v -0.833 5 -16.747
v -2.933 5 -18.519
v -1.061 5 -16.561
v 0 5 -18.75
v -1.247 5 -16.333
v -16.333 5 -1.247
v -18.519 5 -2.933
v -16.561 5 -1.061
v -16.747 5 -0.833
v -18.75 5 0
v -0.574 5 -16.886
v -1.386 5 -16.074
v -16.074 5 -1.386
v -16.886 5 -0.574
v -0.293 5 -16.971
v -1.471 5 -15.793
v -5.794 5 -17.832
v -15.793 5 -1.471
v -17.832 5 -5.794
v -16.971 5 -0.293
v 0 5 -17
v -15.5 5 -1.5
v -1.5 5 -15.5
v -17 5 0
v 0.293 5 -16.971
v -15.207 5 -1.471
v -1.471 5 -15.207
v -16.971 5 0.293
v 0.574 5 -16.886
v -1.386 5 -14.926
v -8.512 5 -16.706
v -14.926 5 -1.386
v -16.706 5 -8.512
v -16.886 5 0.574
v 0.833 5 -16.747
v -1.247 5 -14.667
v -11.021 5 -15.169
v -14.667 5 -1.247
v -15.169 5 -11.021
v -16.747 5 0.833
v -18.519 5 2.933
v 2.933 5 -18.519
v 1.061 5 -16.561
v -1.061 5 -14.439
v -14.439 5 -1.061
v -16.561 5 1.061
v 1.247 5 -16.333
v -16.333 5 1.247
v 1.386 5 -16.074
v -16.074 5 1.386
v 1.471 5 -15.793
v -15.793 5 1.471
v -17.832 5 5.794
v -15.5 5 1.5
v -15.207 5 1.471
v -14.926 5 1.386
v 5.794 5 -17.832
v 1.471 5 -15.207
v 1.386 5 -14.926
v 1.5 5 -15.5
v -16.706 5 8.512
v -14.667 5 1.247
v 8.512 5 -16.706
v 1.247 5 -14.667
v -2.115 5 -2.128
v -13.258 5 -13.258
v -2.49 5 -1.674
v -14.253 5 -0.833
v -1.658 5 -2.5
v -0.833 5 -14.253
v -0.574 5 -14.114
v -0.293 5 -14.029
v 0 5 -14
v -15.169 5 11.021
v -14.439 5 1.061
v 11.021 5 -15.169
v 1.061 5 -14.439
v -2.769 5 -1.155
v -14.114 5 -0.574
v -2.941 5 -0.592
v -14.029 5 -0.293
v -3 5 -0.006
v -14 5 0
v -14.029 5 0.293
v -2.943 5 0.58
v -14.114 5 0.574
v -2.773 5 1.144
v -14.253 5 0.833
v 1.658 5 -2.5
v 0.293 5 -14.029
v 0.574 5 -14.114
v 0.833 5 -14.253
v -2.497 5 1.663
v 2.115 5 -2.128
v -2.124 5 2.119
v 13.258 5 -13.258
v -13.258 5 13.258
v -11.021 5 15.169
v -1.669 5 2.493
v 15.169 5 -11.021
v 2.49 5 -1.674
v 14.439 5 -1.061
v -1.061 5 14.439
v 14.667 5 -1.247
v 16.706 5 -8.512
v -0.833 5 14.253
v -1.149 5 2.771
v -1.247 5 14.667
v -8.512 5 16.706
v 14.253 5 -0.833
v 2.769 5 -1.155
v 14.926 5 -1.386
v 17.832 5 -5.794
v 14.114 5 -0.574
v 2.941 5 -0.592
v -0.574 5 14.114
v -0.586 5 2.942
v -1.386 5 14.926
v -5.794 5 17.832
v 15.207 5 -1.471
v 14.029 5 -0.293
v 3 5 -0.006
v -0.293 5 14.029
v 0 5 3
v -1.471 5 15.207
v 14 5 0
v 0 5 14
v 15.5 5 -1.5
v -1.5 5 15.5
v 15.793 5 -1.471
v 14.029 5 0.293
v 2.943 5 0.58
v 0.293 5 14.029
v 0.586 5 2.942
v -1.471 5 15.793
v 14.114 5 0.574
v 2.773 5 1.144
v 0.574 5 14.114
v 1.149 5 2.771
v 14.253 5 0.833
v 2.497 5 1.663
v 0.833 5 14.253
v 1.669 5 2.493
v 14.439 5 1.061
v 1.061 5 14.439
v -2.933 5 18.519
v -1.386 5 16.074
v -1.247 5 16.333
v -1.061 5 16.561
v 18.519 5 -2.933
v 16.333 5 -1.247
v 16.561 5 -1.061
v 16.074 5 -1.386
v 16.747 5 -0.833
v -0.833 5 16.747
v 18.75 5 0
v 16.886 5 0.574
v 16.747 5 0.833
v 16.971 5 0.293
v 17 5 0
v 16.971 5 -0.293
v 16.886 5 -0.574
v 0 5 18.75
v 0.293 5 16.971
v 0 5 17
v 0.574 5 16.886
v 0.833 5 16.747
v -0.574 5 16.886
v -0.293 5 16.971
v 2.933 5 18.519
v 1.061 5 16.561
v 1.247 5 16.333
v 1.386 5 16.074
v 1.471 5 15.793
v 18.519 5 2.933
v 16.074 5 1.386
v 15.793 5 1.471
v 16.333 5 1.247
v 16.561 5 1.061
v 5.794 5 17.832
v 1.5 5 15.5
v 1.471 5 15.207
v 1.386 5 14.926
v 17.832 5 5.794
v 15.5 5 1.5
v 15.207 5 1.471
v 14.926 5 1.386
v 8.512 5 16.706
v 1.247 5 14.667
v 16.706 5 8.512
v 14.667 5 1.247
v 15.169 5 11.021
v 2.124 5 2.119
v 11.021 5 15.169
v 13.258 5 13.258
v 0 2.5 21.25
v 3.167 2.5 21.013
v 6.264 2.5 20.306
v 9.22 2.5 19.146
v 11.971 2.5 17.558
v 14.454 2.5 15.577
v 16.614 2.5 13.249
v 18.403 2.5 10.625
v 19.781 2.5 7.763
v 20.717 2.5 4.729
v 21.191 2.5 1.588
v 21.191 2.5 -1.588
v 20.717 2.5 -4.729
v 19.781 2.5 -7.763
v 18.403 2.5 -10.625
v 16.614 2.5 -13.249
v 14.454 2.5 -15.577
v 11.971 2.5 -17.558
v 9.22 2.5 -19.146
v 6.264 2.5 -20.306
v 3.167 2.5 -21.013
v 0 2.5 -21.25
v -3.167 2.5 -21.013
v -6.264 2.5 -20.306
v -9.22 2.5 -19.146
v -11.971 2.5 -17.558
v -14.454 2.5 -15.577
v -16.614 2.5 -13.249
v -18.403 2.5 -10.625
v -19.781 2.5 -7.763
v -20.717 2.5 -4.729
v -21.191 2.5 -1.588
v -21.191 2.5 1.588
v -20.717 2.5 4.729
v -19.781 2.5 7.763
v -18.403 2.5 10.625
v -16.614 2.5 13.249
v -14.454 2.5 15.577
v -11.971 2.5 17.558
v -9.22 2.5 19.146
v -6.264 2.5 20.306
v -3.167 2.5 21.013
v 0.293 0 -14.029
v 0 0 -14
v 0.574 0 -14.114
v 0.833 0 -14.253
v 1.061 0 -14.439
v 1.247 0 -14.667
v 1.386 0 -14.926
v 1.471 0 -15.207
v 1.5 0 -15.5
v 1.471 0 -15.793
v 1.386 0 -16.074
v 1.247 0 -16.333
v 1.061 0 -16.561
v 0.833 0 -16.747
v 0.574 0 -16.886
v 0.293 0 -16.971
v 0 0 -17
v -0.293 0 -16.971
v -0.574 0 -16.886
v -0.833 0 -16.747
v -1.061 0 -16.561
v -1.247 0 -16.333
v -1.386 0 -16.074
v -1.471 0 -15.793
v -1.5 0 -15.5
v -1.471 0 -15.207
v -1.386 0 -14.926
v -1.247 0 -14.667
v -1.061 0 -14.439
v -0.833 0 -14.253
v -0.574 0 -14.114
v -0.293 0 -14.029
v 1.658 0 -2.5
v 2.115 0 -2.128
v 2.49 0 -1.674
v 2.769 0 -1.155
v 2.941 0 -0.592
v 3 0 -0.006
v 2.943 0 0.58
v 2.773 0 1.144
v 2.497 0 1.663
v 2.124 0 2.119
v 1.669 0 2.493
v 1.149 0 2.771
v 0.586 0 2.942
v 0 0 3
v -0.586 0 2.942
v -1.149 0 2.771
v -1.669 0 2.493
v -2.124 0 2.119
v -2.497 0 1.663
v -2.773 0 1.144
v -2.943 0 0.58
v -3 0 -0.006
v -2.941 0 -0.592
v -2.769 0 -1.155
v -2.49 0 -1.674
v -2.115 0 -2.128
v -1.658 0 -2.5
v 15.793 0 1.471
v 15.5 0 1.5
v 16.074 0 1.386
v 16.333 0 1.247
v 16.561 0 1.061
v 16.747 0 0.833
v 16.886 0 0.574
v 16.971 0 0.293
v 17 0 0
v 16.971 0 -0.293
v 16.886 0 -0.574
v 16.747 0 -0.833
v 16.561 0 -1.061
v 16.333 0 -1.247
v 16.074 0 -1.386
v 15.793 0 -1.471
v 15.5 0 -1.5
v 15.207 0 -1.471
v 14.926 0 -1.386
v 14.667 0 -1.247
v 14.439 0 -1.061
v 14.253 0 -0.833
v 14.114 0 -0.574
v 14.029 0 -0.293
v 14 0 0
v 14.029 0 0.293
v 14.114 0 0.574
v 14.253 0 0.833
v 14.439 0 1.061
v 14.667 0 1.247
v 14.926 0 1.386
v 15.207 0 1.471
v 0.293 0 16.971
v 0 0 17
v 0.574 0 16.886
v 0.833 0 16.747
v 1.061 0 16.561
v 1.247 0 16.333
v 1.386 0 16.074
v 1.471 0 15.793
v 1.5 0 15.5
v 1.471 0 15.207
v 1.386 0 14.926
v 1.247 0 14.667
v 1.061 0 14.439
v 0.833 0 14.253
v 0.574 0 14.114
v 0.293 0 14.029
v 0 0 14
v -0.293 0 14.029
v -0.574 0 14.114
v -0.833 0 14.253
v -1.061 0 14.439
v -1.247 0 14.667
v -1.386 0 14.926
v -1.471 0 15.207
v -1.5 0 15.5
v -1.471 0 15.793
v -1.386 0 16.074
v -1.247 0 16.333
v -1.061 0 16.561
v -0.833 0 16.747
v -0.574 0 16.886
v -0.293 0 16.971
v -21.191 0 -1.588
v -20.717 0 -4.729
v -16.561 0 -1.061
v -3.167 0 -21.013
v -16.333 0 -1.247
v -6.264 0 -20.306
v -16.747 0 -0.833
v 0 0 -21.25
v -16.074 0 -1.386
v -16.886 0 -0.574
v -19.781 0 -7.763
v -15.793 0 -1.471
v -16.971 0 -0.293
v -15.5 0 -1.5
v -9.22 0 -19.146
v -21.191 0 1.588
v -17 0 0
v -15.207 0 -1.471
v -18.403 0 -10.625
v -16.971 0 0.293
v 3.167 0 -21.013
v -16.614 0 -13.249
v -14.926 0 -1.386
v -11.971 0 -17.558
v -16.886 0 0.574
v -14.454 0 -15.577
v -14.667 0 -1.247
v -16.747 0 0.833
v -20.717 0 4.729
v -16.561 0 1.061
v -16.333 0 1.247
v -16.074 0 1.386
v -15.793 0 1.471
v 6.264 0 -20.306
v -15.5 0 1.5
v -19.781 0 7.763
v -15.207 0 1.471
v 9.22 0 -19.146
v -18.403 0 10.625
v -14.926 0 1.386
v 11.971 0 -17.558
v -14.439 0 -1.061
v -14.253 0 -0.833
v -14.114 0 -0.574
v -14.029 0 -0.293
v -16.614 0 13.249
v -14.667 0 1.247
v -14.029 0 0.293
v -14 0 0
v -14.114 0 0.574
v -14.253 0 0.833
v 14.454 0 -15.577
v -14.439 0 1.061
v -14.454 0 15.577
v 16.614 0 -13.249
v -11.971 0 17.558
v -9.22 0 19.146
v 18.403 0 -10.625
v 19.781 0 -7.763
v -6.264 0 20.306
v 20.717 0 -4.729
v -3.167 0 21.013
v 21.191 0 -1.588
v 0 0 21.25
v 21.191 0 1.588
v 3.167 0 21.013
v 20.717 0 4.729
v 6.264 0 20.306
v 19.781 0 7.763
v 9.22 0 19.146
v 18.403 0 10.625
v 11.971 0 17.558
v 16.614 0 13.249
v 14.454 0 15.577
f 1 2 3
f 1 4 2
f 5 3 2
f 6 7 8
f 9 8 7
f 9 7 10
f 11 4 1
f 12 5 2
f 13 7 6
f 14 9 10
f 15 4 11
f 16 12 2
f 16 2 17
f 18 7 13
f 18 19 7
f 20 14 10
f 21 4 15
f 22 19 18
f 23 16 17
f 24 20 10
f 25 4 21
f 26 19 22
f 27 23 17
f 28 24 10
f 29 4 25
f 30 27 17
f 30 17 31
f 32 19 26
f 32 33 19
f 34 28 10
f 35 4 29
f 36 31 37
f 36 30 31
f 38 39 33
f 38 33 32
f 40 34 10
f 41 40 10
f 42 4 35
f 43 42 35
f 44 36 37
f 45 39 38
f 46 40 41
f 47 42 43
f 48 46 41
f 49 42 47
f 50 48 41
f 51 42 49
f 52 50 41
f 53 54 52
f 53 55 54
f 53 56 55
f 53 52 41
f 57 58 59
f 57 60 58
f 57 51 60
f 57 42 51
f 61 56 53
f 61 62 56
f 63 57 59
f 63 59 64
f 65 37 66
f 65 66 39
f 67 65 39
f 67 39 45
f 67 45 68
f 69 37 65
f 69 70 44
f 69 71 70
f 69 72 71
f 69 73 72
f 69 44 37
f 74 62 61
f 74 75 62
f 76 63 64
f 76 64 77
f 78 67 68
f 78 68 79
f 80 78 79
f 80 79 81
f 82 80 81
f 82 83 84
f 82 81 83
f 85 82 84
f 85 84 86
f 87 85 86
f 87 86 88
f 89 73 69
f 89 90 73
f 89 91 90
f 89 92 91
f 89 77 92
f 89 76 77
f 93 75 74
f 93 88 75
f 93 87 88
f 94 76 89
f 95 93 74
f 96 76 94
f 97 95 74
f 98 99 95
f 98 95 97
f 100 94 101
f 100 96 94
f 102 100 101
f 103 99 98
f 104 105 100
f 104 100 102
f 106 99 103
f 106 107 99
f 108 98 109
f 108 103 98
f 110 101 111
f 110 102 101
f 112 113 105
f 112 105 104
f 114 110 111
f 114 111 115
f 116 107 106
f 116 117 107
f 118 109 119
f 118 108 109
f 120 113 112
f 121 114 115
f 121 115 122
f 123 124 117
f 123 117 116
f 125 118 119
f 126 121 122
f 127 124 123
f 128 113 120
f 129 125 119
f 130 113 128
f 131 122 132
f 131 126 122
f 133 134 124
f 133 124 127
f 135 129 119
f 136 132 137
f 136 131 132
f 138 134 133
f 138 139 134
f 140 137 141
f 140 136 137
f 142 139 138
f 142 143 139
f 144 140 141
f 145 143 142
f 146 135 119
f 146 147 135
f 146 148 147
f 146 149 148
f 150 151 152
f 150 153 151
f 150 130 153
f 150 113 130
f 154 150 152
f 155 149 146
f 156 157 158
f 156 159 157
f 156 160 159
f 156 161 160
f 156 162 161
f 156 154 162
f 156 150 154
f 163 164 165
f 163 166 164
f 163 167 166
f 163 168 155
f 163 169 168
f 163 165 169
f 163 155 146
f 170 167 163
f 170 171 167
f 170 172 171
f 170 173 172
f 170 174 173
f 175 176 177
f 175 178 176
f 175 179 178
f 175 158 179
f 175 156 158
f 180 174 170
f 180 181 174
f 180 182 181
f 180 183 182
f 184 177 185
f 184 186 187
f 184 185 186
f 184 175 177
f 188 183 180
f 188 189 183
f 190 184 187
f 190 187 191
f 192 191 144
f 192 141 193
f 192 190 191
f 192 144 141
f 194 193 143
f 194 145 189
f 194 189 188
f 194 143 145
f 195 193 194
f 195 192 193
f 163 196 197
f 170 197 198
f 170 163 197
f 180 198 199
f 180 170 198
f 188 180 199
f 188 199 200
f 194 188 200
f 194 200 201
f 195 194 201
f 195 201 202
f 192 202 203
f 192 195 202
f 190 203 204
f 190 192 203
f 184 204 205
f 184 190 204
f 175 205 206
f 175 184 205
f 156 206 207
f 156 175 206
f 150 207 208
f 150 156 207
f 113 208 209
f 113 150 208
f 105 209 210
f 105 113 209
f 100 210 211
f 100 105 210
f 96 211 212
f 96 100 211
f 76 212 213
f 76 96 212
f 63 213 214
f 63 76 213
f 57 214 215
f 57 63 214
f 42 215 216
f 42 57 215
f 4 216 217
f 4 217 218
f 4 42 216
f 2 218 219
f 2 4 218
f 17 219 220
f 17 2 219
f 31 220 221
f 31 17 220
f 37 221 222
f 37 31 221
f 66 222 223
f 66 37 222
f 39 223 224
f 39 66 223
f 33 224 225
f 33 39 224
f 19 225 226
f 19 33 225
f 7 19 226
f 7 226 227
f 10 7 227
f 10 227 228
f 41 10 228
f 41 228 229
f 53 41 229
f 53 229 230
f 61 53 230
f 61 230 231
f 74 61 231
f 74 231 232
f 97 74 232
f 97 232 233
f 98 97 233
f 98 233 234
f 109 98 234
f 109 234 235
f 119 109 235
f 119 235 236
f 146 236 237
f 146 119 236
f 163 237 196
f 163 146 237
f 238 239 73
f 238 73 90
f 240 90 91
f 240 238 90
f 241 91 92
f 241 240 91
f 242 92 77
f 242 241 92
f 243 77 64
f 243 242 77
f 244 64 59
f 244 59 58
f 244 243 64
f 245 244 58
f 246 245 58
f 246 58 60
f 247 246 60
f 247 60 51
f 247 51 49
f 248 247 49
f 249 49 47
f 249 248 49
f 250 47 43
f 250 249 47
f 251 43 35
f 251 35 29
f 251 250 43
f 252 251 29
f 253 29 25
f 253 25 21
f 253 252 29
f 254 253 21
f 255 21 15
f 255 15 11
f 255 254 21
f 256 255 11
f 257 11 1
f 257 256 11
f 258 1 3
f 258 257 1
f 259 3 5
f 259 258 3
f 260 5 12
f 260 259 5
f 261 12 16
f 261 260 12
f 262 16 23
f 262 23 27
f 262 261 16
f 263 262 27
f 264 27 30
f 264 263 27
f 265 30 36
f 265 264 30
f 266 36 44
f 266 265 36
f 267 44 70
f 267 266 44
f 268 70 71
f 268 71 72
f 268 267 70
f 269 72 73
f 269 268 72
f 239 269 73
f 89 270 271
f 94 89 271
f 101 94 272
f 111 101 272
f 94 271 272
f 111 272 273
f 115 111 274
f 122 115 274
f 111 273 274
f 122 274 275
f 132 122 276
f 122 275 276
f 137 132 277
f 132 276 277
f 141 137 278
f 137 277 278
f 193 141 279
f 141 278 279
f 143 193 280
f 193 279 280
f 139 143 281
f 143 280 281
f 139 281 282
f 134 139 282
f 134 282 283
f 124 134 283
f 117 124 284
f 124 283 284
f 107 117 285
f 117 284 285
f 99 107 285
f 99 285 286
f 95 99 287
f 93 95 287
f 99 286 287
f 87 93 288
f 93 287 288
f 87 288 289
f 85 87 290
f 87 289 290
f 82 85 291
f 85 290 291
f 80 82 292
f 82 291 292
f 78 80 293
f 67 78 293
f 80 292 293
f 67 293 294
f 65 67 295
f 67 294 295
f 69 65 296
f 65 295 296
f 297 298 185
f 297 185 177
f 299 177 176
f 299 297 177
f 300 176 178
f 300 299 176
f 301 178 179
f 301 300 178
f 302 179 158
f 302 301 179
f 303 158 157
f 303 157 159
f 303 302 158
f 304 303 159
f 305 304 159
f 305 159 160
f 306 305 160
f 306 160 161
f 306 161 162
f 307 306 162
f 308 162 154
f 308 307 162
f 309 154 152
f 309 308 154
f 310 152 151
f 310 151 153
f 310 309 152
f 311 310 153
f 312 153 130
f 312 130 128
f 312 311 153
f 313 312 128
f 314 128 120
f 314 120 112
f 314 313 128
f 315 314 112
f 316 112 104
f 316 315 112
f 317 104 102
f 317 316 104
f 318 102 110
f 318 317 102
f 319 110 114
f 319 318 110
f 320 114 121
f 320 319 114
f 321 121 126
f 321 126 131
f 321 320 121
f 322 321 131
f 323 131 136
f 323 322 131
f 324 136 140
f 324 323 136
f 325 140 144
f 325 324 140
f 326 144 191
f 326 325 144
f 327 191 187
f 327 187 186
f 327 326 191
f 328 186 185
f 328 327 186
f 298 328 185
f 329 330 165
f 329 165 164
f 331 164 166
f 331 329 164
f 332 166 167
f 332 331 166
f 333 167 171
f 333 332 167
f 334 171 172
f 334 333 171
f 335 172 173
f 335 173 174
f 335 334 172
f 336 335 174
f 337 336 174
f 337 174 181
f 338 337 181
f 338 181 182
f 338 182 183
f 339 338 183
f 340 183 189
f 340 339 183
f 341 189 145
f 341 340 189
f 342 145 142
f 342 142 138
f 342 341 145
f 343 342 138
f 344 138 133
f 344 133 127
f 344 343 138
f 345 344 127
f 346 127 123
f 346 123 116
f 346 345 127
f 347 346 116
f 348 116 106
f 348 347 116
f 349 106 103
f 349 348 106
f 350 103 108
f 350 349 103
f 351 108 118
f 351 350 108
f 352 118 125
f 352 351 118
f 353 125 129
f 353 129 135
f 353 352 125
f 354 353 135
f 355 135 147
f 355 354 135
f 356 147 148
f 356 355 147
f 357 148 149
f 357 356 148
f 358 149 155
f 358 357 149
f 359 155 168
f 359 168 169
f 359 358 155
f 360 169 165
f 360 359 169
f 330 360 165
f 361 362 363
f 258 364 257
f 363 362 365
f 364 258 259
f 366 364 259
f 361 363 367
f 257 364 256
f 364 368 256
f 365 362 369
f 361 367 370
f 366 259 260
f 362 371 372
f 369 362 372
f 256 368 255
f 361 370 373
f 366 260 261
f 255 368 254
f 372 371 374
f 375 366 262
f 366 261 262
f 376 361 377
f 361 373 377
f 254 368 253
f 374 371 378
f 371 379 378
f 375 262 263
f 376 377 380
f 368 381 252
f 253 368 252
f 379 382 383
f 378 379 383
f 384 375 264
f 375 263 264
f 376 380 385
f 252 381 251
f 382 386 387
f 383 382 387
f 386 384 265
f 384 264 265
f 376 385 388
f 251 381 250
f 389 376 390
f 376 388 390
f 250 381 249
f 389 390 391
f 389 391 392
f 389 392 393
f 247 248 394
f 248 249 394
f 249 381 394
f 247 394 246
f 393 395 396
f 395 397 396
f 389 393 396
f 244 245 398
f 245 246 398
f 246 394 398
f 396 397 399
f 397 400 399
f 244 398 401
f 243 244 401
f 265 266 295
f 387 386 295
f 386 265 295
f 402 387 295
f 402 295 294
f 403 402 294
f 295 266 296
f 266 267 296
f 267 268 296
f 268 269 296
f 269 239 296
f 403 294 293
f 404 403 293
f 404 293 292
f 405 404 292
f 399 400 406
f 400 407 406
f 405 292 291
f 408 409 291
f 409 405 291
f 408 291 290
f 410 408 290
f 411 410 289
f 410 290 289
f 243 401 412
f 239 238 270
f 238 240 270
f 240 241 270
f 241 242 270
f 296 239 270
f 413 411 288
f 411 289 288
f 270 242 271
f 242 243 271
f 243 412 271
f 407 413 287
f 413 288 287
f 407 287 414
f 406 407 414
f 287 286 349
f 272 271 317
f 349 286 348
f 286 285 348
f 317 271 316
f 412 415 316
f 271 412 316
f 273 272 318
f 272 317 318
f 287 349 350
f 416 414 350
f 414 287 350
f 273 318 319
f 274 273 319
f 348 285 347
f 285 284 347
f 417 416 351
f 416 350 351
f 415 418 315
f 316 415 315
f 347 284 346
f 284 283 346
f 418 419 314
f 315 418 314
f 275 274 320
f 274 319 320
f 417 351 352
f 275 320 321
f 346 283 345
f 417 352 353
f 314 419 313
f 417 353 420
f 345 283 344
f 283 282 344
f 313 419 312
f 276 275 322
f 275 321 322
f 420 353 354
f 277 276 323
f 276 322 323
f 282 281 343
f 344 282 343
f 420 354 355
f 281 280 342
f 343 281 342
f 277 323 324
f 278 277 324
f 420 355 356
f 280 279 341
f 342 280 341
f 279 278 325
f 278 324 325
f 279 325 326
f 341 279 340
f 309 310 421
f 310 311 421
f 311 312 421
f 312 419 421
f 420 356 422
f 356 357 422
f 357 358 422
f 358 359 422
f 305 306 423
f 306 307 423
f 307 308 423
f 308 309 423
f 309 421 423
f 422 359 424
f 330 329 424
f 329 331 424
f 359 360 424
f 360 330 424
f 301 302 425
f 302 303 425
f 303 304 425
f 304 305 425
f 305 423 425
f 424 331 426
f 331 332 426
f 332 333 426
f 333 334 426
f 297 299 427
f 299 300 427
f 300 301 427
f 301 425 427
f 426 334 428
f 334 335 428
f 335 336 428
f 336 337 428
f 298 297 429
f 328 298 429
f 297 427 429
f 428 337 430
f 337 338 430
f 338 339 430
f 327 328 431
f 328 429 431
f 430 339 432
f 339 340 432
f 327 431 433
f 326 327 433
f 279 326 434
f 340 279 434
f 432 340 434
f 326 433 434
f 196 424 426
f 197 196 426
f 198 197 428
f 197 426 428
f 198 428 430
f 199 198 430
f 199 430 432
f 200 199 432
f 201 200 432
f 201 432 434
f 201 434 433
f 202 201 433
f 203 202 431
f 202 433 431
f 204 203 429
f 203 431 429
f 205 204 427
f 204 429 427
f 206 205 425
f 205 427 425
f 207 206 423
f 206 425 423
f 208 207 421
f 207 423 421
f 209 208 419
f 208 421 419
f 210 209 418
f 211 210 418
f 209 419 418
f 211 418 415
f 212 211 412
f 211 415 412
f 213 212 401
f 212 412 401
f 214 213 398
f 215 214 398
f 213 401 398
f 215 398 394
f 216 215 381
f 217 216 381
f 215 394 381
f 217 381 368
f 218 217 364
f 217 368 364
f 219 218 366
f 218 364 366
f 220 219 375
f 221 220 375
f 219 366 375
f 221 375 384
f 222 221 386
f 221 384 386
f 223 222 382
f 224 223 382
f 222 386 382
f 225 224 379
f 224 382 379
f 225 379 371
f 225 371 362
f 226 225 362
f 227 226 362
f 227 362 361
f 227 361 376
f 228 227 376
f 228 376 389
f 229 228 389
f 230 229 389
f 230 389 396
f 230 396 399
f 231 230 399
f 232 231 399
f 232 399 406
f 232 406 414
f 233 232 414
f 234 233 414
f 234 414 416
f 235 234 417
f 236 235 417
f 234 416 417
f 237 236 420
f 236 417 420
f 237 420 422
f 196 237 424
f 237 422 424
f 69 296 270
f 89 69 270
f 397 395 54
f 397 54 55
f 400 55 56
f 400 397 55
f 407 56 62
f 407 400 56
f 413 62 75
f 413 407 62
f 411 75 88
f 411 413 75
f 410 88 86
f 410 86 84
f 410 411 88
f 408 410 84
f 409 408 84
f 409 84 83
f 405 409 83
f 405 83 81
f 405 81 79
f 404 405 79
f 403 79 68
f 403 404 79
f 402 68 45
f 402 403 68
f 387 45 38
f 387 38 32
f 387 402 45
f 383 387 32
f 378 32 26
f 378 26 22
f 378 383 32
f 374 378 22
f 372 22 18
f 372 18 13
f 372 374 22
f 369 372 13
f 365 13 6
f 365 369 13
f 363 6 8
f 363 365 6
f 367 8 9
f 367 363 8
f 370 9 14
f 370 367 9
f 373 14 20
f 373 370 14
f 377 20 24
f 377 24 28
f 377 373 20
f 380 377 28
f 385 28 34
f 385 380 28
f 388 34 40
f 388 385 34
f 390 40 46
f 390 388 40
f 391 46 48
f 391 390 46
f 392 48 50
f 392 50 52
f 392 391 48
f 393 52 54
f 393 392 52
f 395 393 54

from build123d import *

# Parameters (mm, degrees)
SKETCH1_R           = 21.25
SKETCH1_R_2         = 1.5
BOSS_EXTRUDE1_DEPTH = 5
CHAMFER1_SIZE       = 2.5


with BuildPart() as part:
    # Sketch1 → Boss-Extrude1 (new body)
    with BuildSketch(Plane(origin=(0, 0, 0), x_dir=(1, 0, 0), z_dir=(0, 1, 0))):
        with Locations(Location((0, 0, 0), (0, 0, 270))):
            Circle(SKETCH1_R)
        with Locations(Location((0, 15.5, 0), (0, 0, 270))):
            Circle(SKETCH1_R_2, mode=Mode.SUBTRACT)
        with Locations(Location((15.5, 0, 0), (0, 0, 270))):
            Circle(SKETCH1_R_2, mode=Mode.SUBTRACT)
        with Locations(Location((0, -15.5, 0), (0, 0, 270))):
            Circle(SKETCH1_R_2, mode=Mode.SUBTRACT)
        with Locations(Location((-15.5, 0, 0), (0, 0, 270))):
            Circle(SKETCH1_R_2, mode=Mode.SUBTRACT)
        with BuildLine():
            Line((-1.658312395, 2.5), (1.658312395, 2.5))
            ThreePointArc((1.658312395, 2.5), (0, -3), (-1.658312395, 2.5))
        make_face(mode=Mode.SUBTRACT)
    extrude(amount=BOSS_EXTRUDE1_DEPTH)

    # Chamfer1
    chamfer1_edges = [part.edges().sort_by_distance(p)[0] for p in [
        (0, 5, -21.25),
    ]]
    chamfer(chamfer1_edges, length=CHAMFER1_SIZE)


solid = part.part
